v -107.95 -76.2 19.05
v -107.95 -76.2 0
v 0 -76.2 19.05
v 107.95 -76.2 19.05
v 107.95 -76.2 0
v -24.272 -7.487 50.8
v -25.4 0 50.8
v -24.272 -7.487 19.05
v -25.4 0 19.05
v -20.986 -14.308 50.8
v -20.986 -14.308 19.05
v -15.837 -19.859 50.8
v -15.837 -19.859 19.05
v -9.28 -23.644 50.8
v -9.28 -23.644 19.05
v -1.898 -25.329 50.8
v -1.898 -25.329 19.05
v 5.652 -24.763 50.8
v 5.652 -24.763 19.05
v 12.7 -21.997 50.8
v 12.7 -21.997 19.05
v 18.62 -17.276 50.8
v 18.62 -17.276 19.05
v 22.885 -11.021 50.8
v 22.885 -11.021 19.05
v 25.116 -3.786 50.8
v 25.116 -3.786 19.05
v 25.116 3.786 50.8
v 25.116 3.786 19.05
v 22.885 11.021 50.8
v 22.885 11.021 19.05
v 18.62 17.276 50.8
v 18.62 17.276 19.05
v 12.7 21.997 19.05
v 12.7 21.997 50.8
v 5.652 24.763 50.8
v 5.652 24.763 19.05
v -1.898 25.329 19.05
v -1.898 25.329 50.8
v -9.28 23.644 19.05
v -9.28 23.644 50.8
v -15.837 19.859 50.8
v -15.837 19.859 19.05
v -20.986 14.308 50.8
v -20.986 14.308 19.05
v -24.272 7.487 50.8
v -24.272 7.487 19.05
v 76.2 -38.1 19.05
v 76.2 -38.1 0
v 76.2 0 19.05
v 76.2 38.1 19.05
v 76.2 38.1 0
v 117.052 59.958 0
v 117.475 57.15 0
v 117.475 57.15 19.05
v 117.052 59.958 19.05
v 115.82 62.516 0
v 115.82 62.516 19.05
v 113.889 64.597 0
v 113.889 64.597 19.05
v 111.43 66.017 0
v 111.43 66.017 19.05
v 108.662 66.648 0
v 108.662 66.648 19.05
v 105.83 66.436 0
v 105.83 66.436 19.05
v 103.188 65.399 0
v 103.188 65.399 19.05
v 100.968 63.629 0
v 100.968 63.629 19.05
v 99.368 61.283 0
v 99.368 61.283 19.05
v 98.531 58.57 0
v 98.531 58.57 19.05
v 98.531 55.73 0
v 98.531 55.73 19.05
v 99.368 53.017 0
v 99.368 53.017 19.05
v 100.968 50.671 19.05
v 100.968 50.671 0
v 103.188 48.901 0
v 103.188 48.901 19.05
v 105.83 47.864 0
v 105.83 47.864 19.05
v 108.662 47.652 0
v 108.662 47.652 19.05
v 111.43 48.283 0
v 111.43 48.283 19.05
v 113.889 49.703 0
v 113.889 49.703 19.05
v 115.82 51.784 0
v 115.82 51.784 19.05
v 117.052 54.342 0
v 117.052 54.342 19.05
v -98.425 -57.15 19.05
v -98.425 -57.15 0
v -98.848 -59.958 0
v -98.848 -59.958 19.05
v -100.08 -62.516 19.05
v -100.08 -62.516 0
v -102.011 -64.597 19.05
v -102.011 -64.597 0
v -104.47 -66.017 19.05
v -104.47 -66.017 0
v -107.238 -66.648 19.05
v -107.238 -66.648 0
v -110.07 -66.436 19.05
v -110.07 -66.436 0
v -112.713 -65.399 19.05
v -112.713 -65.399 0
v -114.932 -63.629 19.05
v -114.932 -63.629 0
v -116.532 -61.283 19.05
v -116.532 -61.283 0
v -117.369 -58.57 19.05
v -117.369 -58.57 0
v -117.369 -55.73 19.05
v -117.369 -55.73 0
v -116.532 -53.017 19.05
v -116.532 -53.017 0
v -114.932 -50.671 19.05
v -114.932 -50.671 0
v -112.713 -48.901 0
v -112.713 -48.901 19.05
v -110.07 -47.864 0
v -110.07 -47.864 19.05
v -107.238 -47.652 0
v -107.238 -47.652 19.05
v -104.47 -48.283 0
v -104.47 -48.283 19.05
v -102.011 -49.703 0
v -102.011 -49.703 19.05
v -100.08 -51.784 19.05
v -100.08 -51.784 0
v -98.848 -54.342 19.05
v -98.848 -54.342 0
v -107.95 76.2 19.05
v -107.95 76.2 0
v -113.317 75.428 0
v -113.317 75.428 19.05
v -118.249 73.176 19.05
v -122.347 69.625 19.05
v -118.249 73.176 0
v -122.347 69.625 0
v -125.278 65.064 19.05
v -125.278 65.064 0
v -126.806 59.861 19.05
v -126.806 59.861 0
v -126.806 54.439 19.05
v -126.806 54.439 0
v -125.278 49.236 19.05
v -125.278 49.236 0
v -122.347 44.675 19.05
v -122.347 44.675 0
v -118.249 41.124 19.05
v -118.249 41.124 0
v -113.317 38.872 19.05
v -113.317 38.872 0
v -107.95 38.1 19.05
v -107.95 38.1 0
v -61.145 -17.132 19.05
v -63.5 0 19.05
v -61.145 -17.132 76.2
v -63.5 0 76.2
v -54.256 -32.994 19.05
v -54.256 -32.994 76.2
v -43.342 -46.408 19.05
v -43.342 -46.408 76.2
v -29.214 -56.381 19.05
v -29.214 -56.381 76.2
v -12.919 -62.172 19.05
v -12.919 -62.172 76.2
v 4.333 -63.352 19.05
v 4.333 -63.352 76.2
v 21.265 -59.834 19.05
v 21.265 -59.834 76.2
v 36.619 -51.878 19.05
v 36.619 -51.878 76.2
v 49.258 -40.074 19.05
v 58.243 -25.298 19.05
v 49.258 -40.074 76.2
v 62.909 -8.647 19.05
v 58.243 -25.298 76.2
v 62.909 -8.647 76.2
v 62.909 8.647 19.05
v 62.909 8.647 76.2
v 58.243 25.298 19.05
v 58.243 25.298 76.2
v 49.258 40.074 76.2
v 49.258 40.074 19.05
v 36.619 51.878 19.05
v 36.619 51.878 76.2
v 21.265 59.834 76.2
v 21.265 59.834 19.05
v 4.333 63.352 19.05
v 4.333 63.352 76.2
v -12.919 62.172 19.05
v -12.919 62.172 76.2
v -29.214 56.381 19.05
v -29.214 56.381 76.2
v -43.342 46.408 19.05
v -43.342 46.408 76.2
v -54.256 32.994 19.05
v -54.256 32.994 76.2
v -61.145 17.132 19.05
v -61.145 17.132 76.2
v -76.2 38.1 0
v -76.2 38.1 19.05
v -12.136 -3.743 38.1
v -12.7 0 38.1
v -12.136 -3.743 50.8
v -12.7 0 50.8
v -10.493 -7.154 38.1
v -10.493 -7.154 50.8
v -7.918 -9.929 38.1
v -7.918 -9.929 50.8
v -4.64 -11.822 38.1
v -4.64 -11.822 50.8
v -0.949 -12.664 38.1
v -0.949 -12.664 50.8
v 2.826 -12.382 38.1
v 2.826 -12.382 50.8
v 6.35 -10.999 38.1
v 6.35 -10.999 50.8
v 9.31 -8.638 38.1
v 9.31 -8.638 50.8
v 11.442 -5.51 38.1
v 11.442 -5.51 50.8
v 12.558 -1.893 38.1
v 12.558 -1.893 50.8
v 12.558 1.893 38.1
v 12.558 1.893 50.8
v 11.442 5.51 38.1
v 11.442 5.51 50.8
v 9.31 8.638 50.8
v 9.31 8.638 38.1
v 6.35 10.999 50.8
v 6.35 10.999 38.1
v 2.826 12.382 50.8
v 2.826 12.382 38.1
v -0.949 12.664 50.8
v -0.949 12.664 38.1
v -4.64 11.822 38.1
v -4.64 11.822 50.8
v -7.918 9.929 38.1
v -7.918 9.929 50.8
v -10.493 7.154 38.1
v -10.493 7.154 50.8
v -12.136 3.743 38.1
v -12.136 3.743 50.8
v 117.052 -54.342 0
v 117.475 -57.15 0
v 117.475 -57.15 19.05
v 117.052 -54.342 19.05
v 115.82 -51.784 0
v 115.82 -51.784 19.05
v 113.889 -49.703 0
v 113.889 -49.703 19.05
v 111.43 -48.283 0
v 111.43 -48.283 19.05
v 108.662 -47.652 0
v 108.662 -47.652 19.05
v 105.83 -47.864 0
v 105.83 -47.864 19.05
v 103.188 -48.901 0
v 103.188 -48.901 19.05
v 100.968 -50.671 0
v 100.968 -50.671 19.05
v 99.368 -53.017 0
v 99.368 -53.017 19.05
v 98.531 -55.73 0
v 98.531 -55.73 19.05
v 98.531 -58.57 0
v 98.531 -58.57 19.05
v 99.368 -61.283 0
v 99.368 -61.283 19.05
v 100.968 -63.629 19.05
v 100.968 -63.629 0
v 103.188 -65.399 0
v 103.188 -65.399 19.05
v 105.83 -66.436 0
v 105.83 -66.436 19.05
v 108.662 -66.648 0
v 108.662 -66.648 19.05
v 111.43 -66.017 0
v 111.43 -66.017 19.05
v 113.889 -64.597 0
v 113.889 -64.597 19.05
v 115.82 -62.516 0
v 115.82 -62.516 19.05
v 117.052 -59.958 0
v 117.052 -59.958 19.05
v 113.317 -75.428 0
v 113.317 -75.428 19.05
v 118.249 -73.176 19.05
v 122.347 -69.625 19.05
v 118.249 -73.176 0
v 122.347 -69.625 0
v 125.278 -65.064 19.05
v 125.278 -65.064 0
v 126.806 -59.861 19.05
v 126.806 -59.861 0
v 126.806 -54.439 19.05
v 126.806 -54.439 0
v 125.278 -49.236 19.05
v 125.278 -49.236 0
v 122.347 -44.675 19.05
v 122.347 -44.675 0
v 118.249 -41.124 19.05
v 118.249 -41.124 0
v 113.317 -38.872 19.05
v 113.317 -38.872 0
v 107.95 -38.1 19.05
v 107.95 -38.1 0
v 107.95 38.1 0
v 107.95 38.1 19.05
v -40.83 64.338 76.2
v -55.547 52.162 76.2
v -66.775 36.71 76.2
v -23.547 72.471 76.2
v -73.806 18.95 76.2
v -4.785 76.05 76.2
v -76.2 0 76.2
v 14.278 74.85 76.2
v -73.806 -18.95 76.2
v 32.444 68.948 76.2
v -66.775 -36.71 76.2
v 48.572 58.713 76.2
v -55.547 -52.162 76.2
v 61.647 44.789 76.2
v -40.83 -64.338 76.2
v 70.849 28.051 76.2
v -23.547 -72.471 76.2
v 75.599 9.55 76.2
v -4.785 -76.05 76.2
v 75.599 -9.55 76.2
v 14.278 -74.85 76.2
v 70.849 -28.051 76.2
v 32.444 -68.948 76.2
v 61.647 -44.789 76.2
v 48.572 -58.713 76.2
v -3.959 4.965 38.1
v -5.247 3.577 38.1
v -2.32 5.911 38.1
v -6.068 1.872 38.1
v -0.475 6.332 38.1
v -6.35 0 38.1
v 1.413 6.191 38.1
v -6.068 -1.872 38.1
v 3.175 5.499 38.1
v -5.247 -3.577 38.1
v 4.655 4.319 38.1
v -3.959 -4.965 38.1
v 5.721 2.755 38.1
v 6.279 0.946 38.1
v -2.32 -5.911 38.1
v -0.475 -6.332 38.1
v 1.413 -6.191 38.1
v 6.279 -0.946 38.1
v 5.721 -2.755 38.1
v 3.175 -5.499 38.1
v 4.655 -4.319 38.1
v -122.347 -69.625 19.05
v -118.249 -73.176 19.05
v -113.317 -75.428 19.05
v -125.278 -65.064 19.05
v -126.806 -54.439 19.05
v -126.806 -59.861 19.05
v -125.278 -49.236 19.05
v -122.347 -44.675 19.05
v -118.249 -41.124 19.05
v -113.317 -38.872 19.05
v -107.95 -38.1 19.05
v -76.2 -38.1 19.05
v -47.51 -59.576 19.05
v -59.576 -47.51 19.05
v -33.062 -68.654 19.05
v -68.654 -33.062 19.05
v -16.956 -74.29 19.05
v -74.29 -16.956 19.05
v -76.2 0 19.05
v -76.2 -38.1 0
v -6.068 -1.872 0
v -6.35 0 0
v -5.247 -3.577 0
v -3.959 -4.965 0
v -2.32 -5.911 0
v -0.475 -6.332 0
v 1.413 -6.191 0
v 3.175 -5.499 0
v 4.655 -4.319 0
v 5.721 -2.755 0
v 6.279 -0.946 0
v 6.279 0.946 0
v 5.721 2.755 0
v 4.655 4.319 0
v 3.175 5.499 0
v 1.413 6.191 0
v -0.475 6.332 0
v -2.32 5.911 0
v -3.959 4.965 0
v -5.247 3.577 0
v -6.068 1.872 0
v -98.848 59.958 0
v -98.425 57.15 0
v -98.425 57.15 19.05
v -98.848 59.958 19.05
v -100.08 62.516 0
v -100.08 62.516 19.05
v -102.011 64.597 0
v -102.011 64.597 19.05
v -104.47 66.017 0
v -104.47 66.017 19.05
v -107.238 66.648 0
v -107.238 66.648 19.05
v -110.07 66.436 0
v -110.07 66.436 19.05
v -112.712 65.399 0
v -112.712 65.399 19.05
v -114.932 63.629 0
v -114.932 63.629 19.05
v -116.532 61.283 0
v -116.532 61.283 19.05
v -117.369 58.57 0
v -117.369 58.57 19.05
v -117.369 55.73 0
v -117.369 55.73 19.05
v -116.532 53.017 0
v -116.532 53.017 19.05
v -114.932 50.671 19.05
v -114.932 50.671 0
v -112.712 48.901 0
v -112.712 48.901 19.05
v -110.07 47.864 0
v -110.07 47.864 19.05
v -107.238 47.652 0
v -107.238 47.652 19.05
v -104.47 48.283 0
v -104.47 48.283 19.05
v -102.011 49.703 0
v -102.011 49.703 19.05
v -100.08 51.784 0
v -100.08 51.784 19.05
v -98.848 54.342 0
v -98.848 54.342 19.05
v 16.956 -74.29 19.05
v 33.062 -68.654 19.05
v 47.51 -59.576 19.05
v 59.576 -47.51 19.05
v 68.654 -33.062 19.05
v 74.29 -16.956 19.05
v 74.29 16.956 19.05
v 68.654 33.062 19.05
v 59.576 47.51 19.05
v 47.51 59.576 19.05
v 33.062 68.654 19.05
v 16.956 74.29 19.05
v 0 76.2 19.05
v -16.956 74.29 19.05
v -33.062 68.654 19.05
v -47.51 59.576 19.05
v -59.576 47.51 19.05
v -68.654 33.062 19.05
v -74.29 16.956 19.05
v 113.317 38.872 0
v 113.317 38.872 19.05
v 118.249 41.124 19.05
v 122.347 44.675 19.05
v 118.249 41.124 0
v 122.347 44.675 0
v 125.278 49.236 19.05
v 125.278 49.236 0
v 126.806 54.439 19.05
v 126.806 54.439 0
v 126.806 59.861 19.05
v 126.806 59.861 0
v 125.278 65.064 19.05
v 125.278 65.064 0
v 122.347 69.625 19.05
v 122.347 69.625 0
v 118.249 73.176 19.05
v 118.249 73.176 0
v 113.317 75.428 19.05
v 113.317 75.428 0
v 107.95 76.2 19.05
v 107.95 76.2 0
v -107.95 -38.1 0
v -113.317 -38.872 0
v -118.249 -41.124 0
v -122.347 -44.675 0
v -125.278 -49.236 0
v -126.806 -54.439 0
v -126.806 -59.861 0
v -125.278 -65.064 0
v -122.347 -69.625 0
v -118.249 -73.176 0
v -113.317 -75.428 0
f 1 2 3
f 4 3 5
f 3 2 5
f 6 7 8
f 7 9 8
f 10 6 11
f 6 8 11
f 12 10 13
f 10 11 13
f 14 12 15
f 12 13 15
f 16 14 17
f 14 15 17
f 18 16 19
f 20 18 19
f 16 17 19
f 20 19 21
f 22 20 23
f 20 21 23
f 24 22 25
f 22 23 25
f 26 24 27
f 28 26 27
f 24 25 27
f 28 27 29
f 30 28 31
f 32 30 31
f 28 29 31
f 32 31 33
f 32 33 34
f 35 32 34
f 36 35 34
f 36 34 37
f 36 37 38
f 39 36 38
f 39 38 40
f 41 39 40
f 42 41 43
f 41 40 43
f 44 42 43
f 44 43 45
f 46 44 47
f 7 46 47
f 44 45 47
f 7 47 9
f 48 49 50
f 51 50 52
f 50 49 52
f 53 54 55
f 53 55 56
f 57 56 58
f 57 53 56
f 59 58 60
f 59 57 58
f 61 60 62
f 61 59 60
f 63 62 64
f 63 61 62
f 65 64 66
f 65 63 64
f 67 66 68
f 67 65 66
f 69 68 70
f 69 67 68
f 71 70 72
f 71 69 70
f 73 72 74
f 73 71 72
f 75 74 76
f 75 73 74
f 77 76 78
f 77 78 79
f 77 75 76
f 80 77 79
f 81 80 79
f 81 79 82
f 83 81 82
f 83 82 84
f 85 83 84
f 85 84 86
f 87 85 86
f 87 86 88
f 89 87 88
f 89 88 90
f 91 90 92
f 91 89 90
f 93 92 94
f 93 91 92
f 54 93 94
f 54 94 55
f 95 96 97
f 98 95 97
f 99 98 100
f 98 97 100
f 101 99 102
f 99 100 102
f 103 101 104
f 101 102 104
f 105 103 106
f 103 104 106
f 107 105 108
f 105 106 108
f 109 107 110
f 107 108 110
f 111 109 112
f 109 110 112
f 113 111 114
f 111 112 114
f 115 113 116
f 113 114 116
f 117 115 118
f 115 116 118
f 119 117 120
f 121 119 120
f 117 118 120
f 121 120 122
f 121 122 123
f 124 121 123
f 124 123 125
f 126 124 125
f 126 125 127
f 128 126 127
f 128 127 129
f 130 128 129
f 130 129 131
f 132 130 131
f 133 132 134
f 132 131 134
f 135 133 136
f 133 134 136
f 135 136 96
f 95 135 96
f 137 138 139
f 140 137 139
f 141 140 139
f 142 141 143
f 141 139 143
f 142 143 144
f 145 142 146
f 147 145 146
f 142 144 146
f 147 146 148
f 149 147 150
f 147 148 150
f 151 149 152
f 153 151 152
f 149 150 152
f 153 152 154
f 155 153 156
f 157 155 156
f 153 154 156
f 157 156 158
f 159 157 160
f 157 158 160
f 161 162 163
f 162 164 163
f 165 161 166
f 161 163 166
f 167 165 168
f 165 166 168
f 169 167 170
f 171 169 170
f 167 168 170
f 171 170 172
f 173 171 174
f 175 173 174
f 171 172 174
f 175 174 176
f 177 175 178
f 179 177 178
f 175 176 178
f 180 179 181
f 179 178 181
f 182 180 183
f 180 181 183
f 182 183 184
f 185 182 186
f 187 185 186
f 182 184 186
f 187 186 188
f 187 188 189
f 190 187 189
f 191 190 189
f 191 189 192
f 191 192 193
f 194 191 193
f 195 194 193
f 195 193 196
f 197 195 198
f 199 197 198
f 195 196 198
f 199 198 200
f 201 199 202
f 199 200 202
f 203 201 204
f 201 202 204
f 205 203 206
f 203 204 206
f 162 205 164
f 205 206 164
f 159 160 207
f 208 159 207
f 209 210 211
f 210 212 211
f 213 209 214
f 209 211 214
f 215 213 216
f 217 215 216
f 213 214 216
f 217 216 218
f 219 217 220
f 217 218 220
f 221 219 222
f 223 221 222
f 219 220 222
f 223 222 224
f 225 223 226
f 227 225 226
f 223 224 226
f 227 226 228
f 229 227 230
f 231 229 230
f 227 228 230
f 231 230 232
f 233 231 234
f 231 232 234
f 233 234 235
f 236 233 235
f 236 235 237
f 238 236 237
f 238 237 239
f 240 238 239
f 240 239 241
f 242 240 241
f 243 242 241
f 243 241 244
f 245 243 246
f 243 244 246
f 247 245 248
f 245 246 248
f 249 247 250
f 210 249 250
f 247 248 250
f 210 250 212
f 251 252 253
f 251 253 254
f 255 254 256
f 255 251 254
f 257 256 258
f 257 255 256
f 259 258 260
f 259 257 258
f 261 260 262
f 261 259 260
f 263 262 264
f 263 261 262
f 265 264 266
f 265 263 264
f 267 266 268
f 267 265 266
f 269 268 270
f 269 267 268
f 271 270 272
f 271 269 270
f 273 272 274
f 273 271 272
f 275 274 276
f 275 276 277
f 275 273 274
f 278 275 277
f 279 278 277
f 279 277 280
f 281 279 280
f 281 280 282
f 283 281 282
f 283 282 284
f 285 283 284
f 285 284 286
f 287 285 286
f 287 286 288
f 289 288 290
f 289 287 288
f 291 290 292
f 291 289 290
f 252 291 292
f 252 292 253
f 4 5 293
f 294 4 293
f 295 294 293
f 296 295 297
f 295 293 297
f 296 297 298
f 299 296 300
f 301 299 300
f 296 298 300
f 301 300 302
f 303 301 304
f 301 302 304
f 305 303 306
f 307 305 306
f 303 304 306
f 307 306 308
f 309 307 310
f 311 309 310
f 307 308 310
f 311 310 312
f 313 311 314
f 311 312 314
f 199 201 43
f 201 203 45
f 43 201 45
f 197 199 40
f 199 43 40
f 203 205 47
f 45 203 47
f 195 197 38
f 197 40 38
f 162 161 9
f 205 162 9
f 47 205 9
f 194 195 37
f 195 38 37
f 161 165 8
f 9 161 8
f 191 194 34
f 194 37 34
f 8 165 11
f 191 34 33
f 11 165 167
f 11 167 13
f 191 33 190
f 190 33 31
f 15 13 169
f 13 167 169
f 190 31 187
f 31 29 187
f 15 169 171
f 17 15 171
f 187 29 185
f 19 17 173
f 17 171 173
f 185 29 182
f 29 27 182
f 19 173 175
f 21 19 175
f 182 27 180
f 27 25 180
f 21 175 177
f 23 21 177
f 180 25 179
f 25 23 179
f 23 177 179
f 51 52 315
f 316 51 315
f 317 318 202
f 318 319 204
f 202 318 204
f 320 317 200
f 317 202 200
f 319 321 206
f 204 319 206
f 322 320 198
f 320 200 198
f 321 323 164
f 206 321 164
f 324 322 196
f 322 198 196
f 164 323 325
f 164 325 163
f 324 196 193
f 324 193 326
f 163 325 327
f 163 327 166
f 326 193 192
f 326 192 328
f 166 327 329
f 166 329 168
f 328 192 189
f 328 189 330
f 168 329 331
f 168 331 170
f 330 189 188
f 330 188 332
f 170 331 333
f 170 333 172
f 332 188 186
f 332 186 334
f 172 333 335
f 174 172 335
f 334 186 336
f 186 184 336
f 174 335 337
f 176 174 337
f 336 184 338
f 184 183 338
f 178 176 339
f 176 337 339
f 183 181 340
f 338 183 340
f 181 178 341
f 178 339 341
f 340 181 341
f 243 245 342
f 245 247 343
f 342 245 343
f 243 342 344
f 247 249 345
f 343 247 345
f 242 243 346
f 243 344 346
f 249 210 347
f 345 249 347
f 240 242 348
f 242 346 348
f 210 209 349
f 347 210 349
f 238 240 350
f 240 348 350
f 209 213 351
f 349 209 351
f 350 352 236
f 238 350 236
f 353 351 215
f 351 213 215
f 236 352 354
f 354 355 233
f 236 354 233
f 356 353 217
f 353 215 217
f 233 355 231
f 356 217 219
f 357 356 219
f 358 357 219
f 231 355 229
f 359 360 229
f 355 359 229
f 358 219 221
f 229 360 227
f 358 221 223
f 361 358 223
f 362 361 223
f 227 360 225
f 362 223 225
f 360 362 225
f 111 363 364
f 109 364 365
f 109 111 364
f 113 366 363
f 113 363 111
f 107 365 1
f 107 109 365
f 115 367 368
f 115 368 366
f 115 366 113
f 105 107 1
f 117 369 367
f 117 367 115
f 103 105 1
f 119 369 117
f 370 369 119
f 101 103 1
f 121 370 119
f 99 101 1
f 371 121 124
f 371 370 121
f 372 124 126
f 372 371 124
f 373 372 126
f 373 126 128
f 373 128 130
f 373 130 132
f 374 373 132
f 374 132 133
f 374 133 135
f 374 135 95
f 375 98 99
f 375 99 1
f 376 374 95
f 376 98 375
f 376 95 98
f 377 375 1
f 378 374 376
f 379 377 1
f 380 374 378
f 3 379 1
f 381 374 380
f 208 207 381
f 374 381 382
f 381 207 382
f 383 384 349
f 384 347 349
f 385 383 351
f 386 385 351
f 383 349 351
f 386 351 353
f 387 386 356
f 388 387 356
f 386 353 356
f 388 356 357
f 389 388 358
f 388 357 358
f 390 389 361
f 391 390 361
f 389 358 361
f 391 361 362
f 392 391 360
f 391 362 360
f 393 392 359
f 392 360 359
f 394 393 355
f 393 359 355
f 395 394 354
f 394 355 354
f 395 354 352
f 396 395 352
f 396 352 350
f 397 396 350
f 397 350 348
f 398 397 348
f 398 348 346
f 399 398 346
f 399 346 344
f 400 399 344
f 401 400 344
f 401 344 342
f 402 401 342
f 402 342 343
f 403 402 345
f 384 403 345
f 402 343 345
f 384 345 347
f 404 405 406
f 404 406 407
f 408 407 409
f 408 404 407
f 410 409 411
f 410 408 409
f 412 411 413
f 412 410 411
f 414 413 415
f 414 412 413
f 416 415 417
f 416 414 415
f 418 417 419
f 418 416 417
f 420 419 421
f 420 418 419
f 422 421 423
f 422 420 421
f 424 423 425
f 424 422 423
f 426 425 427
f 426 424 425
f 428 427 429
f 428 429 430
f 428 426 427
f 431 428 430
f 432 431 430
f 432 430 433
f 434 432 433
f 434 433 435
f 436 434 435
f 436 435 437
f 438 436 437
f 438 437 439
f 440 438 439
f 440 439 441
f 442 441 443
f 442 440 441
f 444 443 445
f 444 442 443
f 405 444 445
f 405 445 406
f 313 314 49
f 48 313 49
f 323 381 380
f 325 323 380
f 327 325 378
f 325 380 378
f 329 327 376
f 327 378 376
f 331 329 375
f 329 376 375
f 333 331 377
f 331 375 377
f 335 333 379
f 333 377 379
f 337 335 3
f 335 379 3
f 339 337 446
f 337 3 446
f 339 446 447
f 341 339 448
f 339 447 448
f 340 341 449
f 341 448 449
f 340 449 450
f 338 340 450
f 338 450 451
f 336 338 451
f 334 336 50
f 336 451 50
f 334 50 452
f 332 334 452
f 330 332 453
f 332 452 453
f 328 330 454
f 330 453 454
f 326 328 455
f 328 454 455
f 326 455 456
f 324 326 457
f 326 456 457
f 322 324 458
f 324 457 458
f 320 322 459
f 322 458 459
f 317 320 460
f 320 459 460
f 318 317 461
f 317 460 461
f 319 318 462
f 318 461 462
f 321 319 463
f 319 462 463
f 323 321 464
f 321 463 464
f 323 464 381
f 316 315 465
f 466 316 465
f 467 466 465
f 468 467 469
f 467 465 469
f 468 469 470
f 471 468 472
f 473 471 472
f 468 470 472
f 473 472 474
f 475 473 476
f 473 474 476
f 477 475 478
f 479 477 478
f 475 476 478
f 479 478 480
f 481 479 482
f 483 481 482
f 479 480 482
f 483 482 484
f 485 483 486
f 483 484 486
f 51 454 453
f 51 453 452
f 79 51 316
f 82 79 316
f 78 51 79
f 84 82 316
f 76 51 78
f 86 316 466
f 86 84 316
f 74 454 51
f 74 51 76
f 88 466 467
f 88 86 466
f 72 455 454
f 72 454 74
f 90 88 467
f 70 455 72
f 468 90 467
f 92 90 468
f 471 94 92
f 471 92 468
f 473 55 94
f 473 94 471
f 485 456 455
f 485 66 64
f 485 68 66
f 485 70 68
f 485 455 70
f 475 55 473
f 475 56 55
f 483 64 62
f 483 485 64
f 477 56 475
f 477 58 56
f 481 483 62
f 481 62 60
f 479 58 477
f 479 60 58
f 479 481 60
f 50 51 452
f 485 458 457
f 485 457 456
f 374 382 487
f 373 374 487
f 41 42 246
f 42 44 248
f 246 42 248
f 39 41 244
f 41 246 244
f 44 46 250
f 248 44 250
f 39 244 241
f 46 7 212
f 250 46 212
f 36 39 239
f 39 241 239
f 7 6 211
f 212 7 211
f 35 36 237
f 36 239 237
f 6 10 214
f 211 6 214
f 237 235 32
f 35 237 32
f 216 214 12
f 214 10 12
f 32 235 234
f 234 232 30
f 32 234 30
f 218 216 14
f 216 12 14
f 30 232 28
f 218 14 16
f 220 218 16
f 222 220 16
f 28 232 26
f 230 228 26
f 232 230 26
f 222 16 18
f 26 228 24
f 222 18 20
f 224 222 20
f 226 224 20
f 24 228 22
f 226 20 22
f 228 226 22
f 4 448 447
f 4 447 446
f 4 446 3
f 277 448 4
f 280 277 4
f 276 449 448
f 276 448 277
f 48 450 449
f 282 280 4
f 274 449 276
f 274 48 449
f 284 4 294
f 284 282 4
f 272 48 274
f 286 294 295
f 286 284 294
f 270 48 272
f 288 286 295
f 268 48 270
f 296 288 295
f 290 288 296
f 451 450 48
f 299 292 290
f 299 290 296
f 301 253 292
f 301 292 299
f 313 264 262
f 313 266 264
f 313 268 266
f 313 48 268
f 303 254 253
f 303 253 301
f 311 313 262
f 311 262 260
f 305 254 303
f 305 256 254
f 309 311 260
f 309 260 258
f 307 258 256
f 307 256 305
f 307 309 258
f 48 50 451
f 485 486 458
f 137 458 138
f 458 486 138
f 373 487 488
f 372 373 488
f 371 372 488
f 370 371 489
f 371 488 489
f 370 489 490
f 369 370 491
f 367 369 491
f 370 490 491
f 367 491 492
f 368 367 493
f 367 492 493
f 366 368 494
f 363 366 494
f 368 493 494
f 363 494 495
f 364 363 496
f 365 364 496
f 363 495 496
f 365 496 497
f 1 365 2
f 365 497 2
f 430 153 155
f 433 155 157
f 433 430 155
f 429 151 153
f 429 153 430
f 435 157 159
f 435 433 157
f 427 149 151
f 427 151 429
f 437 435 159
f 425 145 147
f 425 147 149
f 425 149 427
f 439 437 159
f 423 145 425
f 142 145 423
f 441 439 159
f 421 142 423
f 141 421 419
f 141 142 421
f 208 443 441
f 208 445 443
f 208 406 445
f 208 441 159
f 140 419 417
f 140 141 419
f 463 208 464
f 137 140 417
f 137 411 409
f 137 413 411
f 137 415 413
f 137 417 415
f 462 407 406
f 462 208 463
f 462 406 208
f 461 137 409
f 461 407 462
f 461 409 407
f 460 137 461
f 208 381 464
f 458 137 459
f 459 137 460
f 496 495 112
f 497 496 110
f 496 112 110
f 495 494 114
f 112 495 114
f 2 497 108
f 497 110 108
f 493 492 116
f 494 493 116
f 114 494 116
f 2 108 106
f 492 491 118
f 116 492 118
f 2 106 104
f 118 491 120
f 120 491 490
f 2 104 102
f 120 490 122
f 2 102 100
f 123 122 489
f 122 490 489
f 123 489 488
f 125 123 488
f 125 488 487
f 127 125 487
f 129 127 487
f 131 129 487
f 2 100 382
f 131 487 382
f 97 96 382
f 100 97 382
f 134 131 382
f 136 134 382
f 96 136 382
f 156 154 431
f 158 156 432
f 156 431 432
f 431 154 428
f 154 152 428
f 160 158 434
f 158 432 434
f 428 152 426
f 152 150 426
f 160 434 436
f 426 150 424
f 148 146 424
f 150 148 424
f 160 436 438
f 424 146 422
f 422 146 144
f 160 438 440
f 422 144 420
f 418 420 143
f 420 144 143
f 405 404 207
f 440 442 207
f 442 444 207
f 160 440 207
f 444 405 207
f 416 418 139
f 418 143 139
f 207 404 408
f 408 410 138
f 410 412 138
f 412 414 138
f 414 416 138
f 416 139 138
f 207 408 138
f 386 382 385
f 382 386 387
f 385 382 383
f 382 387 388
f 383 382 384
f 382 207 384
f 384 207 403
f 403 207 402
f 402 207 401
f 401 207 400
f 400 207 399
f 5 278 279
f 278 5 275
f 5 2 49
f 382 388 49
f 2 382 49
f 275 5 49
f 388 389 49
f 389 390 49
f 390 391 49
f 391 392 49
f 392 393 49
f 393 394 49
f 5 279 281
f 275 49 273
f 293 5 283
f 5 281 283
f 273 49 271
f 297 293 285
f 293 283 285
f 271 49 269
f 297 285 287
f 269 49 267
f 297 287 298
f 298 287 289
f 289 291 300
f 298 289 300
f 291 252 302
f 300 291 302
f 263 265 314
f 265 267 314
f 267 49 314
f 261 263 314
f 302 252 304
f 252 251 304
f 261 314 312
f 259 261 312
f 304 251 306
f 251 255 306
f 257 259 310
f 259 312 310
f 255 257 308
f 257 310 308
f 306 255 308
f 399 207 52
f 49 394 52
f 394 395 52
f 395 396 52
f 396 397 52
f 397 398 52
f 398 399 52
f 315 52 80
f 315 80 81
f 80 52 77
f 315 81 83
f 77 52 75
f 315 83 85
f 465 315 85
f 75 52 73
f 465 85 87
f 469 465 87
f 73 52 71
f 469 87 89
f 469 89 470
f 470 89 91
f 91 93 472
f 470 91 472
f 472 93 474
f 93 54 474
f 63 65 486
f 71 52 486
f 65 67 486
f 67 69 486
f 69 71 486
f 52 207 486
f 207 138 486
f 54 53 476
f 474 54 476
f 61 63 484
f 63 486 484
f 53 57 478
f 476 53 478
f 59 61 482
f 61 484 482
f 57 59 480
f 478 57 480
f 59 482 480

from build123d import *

# Parameters (mm, degrees)
F2_R     = 9.525
F3_DEPTH = 19.05


with BuildPart() as f1:
    # F0 (on Front) → F1 (revolve)
    with BuildSketch(Plane.XZ):
        Polygon((-76.2, 0), (-6.35, 0), (-6.35, 38.1), (-12.7, 38.1), (-12.7, 50.8), (-25.4, 50.8), (-25.4, 19.05), (-63.5, 19.05), (-63.5, 76.2), (-76.2, 76.2), align=None)
    revolve(axis=Axis((0, 0, 38.1), (0, 0, 1)))

    # F2 (on Top) → F3 (join)
    with BuildSketch(Plane.XY):
        with BuildLine():
            Line((-107.95, -76.2), (0, -76.2))
            ThreePointArc((0, -76.2), (-53.8815367264, -53.8815367264), (-76.2, 0))
            Line((-76.2, 0), (-76.2, -38.1))
            Line((-76.2, -38.1), (-107.95, -38.1))
            Line((-107.95, -38.1), (-107.95, -47.625))
            ThreePointArc((-107.95, -47.625), (-101.2148079092, -50.4148079092), (-98.425, -57.15))
            ThreePointArc((-98.425, -57.15), (-101.2148079092, -63.8851920908), (-107.95, -66.675))
            Line((-107.95, -66.675), (-107.95, -76.2))
        make_face()
        with BuildLine():
            ThreePointArc((-107.95, -38.1), (-127, -57.15), (-107.95, -76.2))
            Line((-107.95, -76.2), (-107.95, -66.675))
            ThreePointArc((-107.95, -66.675), (-117.475, -57.15), (-107.95, -47.625))
            Line((-107.95, -47.625), (-107.95, -38.1))
        make_face()
        with BuildLine():
            Line((-76.2, 38.1), (-76.2, 0))
            ThreePointArc((-76.2, 0), (-53.8815367264, 53.8815367264), (0, 76.2))
            Line((0, 76.2), (-107.95, 76.2))
            ThreePointArc((-107.95, 76.2), (-127, 57.15), (-107.95, 38.1))
            Line((-107.95, 38.1), (-76.2, 38.1))
        make_face()
        with Locations((-107.95, 57.15)):
            Circle(F2_R, mode=Mode.SUBTRACT)
        with BuildLine():
            ThreePointArc((0, 76.2), (53.8815367264, 53.8815367264), (76.2, 0))
            Line((76.2, 0), (76.2, 38.1))
            Line((76.2, 38.1), (107.95, 38.1))
            ThreePointArc((107.95, 38.1), (127, 57.15), (107.95, 76.2))
            Line((107.95, 76.2), (0, 76.2))
        make_face()
        with Locations((107.95, 57.15)):
            Circle(F2_R, mode=Mode.SUBTRACT)
        with BuildLine():
            ThreePointArc((76.2, 0), (53.8815367264, -53.8815367264), (0, -76.2))
            Line((0, -76.2), (107.95, -76.2))
            ThreePointArc((107.95, -76.2), (127, -57.15), (107.95, -38.1))
            Line((107.95, -38.1), (76.2, -38.1))
            Line((76.2, -38.1), (76.2, 0))
        make_face()
        with Locations((107.95, -57.15)):
            Circle(F2_R, mode=Mode.SUBTRACT)
    extrude(amount=F3_DEPTH)


solid = f1.part
